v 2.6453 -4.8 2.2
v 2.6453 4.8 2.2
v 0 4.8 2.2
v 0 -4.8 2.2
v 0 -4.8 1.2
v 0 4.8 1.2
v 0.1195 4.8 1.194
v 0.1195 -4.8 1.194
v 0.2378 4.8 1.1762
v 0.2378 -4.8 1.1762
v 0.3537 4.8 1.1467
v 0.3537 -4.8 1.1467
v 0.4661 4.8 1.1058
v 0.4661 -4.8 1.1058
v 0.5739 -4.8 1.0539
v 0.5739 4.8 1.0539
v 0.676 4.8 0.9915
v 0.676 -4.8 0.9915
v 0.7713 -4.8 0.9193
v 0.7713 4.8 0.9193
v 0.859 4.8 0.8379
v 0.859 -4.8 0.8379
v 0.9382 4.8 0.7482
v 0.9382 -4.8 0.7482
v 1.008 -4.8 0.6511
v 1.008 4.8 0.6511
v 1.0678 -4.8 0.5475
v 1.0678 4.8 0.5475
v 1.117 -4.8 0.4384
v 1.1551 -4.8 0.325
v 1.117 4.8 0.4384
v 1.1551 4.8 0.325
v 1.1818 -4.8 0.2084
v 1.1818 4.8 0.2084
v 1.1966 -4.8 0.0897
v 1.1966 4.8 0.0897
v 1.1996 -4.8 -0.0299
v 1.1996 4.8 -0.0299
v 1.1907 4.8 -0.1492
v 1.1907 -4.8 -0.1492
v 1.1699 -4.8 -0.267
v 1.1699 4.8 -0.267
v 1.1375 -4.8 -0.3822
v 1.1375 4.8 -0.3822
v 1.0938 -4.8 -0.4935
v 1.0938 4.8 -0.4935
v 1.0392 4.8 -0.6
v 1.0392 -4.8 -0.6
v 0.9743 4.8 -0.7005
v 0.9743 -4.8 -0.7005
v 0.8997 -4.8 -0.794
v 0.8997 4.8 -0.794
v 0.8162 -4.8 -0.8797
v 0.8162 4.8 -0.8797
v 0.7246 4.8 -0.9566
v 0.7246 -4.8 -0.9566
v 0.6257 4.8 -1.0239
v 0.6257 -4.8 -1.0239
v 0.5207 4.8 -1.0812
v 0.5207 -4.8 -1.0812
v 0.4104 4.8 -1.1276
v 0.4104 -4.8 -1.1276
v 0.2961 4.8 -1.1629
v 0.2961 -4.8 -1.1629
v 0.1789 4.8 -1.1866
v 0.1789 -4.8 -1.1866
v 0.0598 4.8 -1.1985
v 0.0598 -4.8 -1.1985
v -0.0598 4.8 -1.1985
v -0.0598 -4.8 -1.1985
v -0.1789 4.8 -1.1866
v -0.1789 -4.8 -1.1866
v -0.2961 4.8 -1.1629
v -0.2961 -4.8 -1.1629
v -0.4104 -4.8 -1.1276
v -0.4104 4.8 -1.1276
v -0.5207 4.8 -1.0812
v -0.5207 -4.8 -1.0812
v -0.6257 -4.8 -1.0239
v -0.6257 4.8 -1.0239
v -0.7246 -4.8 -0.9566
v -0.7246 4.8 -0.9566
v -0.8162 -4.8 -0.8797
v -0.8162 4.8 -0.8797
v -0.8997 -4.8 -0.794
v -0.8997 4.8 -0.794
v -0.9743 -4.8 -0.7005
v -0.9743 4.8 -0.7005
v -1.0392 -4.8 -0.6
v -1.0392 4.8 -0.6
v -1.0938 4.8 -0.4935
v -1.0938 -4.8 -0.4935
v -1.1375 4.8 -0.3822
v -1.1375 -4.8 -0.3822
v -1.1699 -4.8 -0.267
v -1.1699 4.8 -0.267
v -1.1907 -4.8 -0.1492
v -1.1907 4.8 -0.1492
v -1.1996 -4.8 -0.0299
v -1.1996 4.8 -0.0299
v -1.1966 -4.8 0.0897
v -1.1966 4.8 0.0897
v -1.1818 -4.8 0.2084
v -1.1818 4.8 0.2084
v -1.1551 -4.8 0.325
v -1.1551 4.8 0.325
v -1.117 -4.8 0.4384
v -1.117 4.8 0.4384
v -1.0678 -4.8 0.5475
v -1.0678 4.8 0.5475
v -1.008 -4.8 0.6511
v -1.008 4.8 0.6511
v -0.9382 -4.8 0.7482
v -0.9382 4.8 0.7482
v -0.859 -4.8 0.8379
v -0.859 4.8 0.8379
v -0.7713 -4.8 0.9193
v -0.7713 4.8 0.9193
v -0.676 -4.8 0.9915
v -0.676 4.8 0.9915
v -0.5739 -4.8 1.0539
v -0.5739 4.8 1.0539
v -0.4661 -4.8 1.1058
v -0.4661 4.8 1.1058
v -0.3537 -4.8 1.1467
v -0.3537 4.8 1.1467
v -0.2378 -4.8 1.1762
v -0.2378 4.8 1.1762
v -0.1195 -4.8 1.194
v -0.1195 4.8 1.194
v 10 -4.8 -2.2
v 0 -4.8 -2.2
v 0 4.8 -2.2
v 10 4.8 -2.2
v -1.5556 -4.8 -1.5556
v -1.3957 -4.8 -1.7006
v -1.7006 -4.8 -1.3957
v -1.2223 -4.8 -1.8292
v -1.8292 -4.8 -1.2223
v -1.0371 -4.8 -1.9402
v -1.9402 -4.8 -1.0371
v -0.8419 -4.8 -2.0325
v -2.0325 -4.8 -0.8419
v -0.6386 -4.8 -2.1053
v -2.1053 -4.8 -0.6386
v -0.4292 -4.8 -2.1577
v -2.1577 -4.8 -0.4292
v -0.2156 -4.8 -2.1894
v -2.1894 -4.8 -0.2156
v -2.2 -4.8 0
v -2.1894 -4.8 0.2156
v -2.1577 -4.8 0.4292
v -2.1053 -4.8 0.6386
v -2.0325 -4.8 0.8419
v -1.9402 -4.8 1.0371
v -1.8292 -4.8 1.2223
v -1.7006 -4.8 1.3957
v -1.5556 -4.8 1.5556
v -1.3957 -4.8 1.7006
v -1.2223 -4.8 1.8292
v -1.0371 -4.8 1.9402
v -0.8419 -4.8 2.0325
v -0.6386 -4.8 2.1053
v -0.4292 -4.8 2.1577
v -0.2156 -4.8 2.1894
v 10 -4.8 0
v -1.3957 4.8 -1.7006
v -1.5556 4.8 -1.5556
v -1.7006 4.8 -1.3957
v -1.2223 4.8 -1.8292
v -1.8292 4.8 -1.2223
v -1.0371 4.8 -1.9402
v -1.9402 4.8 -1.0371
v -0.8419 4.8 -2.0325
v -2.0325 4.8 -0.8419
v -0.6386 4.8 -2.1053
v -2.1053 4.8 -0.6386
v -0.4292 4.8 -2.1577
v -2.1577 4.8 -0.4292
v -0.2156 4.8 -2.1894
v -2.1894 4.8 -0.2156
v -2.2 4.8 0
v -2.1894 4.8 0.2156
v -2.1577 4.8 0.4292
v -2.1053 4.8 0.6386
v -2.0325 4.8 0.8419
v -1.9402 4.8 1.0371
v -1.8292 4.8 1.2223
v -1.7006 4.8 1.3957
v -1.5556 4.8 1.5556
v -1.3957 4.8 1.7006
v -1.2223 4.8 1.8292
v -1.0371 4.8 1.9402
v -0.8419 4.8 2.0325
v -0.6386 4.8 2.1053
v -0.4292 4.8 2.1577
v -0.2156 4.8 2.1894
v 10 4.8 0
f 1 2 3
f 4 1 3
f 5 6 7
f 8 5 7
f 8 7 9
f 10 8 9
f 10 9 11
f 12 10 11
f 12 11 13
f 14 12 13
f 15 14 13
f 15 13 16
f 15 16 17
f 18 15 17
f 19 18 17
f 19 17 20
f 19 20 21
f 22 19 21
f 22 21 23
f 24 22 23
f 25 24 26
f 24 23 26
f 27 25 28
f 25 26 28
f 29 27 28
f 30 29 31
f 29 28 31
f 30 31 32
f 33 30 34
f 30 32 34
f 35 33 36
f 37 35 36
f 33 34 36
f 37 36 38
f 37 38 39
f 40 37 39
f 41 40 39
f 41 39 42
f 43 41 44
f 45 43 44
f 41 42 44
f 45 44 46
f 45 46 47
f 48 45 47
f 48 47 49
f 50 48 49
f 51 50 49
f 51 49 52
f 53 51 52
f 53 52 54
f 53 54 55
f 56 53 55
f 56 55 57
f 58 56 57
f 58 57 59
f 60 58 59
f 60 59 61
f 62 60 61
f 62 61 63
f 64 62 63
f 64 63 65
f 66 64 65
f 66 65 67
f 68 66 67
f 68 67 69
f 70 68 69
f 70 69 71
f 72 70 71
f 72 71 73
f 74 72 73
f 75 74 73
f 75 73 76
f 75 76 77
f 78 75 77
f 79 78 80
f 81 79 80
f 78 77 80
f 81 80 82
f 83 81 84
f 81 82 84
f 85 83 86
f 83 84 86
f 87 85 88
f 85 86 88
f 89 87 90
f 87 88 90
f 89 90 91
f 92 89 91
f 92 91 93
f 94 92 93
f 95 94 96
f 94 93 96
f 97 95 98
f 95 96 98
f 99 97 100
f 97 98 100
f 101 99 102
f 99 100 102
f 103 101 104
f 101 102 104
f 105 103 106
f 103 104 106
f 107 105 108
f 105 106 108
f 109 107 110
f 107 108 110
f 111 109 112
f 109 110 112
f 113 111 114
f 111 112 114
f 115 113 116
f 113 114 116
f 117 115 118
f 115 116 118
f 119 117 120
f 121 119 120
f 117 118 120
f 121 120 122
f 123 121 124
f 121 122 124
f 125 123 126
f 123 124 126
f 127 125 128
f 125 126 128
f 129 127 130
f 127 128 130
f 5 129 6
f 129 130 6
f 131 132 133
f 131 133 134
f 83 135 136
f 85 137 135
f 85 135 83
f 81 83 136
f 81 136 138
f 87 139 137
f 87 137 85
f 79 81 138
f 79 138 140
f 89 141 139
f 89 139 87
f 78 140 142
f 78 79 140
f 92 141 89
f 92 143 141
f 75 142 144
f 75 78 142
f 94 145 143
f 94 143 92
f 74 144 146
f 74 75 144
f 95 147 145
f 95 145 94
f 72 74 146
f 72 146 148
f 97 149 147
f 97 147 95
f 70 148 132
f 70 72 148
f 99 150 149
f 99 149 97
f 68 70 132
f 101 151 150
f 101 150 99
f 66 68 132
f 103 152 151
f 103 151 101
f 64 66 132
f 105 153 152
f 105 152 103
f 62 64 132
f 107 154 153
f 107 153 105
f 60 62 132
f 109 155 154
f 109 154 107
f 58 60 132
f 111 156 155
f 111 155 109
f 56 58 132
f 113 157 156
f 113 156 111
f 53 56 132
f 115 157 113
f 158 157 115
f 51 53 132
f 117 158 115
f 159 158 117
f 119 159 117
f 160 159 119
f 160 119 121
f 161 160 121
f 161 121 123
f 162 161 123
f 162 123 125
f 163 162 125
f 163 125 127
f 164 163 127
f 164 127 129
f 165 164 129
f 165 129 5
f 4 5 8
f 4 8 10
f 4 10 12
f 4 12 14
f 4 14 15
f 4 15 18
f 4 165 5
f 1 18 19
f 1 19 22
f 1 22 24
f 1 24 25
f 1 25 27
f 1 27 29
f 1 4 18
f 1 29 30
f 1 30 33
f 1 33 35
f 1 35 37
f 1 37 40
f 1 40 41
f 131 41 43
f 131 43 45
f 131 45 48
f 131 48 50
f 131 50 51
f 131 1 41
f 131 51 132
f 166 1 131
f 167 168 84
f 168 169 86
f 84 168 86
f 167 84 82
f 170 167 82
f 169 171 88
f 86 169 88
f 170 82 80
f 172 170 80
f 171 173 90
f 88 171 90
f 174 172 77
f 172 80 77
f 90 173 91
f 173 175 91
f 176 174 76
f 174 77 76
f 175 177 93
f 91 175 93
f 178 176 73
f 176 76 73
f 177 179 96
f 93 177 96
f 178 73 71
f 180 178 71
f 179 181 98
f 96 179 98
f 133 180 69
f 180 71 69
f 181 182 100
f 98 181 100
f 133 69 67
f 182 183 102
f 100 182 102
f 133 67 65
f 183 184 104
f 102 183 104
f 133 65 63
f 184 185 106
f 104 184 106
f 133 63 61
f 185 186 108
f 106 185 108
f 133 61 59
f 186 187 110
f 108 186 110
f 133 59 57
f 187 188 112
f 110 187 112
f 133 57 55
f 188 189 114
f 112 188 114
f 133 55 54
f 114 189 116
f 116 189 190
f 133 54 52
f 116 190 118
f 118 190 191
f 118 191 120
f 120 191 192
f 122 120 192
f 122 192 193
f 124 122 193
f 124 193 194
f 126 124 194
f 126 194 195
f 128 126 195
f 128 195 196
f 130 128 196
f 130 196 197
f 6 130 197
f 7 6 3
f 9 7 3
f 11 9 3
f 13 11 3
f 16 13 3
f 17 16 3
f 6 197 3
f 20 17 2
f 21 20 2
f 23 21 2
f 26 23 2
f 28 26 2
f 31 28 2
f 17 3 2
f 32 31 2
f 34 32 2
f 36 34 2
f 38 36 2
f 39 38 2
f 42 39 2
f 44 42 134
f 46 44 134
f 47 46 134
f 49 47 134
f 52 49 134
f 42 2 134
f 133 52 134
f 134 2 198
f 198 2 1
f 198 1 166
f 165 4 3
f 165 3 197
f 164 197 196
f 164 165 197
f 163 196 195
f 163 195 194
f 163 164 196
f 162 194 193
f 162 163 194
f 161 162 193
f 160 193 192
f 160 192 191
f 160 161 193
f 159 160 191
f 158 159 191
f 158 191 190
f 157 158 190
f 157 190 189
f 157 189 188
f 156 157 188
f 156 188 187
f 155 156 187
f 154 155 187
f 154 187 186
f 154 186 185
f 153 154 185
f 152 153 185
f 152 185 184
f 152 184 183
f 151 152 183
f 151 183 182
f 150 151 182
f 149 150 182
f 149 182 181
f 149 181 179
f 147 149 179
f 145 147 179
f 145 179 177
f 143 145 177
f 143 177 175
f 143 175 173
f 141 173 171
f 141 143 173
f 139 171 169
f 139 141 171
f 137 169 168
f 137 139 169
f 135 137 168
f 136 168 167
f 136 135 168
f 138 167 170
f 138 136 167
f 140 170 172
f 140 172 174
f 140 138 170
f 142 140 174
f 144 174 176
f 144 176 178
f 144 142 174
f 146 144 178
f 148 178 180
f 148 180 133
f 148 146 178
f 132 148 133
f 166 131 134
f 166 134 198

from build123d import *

# Parameters (mm, degrees)
BOSS_EXTRUDE1_DEPTH      = 5
BOSS_EXTRUDE1_DEPTH_BACK = 5
SKETCH3_R                = 1.2
CUT_EXTRUDE1_DEPTH       = 10
SKETCH4_W                = 13.374580466
SKETCH4_H                = 4.798064452
CUT_EXTRUDE2_DEPTH       = 0.2
CUT_EXTRUDE3_DEPTH       = 10


with BuildPart() as part:
    # Sketch2 → Boss-Extrude1 (new, two sides: drawn at the far end of the back side and taken through both)
    with BuildSketch(Plane(origin=(0, 0, 0), x_dir=(1, 0, 0), z_dir=(0, 1, 0)).offset(-BOSS_EXTRUDE1_DEPTH_BACK)):
        with BuildLine():
            Line((0, 2.2), (10, 2.2))
            Line((10, 2.2), (10, -2.2))
            Line((10, -2.2), (0, -2.2))
            ThreePointArc((0, -2.2), (-2.2, 0), (0, 2.2))
        make_face()
    extrude(amount=BOSS_EXTRUDE1_DEPTH + BOSS_EXTRUDE1_DEPTH_BACK)

    # Sketch3 → Cut-Extrude1 (cut)
    with BuildSketch(Plane(origin=(0, 5, 0), x_dir=(1, 0, 0), z_dir=(0, 1, 0))):
        Circle(SKETCH3_R)
    extrude(amount=-CUT_EXTRUDE1_DEPTH, mode=Mode.SUBTRACT)

    # Sketch4 → Cut-Extrude2 (cut)
    with BuildSketch(Plane.XZ.offset(5)):
        with Locations((3.312709767, -0.199032226)):
            Rectangle(SKETCH4_W, SKETCH4_H)
    cut_extrude2 = extrude(amount=-CUT_EXTRUDE2_DEPTH, mode=Mode.SUBTRACT)

    # Mirror1: Cut-Extrude2 across plane
    add(cut_extrude2.mirror(Plane.ZX), mode=Mode.SUBTRACT)

    # Sketch5 → Cut-Extrude3 (cut)
    with BuildSketch(Plane(origin=(0, 4.8, 0), x_dir=(1, 0, 0), z_dir=(0, 1, 0))):
        Polygon((2.645324972, -2.2), (10, 0), (10, -2.2), align=None)
    extrude(amount=-CUT_EXTRUDE3_DEPTH, mode=Mode.SUBTRACT)


solid = part.part
